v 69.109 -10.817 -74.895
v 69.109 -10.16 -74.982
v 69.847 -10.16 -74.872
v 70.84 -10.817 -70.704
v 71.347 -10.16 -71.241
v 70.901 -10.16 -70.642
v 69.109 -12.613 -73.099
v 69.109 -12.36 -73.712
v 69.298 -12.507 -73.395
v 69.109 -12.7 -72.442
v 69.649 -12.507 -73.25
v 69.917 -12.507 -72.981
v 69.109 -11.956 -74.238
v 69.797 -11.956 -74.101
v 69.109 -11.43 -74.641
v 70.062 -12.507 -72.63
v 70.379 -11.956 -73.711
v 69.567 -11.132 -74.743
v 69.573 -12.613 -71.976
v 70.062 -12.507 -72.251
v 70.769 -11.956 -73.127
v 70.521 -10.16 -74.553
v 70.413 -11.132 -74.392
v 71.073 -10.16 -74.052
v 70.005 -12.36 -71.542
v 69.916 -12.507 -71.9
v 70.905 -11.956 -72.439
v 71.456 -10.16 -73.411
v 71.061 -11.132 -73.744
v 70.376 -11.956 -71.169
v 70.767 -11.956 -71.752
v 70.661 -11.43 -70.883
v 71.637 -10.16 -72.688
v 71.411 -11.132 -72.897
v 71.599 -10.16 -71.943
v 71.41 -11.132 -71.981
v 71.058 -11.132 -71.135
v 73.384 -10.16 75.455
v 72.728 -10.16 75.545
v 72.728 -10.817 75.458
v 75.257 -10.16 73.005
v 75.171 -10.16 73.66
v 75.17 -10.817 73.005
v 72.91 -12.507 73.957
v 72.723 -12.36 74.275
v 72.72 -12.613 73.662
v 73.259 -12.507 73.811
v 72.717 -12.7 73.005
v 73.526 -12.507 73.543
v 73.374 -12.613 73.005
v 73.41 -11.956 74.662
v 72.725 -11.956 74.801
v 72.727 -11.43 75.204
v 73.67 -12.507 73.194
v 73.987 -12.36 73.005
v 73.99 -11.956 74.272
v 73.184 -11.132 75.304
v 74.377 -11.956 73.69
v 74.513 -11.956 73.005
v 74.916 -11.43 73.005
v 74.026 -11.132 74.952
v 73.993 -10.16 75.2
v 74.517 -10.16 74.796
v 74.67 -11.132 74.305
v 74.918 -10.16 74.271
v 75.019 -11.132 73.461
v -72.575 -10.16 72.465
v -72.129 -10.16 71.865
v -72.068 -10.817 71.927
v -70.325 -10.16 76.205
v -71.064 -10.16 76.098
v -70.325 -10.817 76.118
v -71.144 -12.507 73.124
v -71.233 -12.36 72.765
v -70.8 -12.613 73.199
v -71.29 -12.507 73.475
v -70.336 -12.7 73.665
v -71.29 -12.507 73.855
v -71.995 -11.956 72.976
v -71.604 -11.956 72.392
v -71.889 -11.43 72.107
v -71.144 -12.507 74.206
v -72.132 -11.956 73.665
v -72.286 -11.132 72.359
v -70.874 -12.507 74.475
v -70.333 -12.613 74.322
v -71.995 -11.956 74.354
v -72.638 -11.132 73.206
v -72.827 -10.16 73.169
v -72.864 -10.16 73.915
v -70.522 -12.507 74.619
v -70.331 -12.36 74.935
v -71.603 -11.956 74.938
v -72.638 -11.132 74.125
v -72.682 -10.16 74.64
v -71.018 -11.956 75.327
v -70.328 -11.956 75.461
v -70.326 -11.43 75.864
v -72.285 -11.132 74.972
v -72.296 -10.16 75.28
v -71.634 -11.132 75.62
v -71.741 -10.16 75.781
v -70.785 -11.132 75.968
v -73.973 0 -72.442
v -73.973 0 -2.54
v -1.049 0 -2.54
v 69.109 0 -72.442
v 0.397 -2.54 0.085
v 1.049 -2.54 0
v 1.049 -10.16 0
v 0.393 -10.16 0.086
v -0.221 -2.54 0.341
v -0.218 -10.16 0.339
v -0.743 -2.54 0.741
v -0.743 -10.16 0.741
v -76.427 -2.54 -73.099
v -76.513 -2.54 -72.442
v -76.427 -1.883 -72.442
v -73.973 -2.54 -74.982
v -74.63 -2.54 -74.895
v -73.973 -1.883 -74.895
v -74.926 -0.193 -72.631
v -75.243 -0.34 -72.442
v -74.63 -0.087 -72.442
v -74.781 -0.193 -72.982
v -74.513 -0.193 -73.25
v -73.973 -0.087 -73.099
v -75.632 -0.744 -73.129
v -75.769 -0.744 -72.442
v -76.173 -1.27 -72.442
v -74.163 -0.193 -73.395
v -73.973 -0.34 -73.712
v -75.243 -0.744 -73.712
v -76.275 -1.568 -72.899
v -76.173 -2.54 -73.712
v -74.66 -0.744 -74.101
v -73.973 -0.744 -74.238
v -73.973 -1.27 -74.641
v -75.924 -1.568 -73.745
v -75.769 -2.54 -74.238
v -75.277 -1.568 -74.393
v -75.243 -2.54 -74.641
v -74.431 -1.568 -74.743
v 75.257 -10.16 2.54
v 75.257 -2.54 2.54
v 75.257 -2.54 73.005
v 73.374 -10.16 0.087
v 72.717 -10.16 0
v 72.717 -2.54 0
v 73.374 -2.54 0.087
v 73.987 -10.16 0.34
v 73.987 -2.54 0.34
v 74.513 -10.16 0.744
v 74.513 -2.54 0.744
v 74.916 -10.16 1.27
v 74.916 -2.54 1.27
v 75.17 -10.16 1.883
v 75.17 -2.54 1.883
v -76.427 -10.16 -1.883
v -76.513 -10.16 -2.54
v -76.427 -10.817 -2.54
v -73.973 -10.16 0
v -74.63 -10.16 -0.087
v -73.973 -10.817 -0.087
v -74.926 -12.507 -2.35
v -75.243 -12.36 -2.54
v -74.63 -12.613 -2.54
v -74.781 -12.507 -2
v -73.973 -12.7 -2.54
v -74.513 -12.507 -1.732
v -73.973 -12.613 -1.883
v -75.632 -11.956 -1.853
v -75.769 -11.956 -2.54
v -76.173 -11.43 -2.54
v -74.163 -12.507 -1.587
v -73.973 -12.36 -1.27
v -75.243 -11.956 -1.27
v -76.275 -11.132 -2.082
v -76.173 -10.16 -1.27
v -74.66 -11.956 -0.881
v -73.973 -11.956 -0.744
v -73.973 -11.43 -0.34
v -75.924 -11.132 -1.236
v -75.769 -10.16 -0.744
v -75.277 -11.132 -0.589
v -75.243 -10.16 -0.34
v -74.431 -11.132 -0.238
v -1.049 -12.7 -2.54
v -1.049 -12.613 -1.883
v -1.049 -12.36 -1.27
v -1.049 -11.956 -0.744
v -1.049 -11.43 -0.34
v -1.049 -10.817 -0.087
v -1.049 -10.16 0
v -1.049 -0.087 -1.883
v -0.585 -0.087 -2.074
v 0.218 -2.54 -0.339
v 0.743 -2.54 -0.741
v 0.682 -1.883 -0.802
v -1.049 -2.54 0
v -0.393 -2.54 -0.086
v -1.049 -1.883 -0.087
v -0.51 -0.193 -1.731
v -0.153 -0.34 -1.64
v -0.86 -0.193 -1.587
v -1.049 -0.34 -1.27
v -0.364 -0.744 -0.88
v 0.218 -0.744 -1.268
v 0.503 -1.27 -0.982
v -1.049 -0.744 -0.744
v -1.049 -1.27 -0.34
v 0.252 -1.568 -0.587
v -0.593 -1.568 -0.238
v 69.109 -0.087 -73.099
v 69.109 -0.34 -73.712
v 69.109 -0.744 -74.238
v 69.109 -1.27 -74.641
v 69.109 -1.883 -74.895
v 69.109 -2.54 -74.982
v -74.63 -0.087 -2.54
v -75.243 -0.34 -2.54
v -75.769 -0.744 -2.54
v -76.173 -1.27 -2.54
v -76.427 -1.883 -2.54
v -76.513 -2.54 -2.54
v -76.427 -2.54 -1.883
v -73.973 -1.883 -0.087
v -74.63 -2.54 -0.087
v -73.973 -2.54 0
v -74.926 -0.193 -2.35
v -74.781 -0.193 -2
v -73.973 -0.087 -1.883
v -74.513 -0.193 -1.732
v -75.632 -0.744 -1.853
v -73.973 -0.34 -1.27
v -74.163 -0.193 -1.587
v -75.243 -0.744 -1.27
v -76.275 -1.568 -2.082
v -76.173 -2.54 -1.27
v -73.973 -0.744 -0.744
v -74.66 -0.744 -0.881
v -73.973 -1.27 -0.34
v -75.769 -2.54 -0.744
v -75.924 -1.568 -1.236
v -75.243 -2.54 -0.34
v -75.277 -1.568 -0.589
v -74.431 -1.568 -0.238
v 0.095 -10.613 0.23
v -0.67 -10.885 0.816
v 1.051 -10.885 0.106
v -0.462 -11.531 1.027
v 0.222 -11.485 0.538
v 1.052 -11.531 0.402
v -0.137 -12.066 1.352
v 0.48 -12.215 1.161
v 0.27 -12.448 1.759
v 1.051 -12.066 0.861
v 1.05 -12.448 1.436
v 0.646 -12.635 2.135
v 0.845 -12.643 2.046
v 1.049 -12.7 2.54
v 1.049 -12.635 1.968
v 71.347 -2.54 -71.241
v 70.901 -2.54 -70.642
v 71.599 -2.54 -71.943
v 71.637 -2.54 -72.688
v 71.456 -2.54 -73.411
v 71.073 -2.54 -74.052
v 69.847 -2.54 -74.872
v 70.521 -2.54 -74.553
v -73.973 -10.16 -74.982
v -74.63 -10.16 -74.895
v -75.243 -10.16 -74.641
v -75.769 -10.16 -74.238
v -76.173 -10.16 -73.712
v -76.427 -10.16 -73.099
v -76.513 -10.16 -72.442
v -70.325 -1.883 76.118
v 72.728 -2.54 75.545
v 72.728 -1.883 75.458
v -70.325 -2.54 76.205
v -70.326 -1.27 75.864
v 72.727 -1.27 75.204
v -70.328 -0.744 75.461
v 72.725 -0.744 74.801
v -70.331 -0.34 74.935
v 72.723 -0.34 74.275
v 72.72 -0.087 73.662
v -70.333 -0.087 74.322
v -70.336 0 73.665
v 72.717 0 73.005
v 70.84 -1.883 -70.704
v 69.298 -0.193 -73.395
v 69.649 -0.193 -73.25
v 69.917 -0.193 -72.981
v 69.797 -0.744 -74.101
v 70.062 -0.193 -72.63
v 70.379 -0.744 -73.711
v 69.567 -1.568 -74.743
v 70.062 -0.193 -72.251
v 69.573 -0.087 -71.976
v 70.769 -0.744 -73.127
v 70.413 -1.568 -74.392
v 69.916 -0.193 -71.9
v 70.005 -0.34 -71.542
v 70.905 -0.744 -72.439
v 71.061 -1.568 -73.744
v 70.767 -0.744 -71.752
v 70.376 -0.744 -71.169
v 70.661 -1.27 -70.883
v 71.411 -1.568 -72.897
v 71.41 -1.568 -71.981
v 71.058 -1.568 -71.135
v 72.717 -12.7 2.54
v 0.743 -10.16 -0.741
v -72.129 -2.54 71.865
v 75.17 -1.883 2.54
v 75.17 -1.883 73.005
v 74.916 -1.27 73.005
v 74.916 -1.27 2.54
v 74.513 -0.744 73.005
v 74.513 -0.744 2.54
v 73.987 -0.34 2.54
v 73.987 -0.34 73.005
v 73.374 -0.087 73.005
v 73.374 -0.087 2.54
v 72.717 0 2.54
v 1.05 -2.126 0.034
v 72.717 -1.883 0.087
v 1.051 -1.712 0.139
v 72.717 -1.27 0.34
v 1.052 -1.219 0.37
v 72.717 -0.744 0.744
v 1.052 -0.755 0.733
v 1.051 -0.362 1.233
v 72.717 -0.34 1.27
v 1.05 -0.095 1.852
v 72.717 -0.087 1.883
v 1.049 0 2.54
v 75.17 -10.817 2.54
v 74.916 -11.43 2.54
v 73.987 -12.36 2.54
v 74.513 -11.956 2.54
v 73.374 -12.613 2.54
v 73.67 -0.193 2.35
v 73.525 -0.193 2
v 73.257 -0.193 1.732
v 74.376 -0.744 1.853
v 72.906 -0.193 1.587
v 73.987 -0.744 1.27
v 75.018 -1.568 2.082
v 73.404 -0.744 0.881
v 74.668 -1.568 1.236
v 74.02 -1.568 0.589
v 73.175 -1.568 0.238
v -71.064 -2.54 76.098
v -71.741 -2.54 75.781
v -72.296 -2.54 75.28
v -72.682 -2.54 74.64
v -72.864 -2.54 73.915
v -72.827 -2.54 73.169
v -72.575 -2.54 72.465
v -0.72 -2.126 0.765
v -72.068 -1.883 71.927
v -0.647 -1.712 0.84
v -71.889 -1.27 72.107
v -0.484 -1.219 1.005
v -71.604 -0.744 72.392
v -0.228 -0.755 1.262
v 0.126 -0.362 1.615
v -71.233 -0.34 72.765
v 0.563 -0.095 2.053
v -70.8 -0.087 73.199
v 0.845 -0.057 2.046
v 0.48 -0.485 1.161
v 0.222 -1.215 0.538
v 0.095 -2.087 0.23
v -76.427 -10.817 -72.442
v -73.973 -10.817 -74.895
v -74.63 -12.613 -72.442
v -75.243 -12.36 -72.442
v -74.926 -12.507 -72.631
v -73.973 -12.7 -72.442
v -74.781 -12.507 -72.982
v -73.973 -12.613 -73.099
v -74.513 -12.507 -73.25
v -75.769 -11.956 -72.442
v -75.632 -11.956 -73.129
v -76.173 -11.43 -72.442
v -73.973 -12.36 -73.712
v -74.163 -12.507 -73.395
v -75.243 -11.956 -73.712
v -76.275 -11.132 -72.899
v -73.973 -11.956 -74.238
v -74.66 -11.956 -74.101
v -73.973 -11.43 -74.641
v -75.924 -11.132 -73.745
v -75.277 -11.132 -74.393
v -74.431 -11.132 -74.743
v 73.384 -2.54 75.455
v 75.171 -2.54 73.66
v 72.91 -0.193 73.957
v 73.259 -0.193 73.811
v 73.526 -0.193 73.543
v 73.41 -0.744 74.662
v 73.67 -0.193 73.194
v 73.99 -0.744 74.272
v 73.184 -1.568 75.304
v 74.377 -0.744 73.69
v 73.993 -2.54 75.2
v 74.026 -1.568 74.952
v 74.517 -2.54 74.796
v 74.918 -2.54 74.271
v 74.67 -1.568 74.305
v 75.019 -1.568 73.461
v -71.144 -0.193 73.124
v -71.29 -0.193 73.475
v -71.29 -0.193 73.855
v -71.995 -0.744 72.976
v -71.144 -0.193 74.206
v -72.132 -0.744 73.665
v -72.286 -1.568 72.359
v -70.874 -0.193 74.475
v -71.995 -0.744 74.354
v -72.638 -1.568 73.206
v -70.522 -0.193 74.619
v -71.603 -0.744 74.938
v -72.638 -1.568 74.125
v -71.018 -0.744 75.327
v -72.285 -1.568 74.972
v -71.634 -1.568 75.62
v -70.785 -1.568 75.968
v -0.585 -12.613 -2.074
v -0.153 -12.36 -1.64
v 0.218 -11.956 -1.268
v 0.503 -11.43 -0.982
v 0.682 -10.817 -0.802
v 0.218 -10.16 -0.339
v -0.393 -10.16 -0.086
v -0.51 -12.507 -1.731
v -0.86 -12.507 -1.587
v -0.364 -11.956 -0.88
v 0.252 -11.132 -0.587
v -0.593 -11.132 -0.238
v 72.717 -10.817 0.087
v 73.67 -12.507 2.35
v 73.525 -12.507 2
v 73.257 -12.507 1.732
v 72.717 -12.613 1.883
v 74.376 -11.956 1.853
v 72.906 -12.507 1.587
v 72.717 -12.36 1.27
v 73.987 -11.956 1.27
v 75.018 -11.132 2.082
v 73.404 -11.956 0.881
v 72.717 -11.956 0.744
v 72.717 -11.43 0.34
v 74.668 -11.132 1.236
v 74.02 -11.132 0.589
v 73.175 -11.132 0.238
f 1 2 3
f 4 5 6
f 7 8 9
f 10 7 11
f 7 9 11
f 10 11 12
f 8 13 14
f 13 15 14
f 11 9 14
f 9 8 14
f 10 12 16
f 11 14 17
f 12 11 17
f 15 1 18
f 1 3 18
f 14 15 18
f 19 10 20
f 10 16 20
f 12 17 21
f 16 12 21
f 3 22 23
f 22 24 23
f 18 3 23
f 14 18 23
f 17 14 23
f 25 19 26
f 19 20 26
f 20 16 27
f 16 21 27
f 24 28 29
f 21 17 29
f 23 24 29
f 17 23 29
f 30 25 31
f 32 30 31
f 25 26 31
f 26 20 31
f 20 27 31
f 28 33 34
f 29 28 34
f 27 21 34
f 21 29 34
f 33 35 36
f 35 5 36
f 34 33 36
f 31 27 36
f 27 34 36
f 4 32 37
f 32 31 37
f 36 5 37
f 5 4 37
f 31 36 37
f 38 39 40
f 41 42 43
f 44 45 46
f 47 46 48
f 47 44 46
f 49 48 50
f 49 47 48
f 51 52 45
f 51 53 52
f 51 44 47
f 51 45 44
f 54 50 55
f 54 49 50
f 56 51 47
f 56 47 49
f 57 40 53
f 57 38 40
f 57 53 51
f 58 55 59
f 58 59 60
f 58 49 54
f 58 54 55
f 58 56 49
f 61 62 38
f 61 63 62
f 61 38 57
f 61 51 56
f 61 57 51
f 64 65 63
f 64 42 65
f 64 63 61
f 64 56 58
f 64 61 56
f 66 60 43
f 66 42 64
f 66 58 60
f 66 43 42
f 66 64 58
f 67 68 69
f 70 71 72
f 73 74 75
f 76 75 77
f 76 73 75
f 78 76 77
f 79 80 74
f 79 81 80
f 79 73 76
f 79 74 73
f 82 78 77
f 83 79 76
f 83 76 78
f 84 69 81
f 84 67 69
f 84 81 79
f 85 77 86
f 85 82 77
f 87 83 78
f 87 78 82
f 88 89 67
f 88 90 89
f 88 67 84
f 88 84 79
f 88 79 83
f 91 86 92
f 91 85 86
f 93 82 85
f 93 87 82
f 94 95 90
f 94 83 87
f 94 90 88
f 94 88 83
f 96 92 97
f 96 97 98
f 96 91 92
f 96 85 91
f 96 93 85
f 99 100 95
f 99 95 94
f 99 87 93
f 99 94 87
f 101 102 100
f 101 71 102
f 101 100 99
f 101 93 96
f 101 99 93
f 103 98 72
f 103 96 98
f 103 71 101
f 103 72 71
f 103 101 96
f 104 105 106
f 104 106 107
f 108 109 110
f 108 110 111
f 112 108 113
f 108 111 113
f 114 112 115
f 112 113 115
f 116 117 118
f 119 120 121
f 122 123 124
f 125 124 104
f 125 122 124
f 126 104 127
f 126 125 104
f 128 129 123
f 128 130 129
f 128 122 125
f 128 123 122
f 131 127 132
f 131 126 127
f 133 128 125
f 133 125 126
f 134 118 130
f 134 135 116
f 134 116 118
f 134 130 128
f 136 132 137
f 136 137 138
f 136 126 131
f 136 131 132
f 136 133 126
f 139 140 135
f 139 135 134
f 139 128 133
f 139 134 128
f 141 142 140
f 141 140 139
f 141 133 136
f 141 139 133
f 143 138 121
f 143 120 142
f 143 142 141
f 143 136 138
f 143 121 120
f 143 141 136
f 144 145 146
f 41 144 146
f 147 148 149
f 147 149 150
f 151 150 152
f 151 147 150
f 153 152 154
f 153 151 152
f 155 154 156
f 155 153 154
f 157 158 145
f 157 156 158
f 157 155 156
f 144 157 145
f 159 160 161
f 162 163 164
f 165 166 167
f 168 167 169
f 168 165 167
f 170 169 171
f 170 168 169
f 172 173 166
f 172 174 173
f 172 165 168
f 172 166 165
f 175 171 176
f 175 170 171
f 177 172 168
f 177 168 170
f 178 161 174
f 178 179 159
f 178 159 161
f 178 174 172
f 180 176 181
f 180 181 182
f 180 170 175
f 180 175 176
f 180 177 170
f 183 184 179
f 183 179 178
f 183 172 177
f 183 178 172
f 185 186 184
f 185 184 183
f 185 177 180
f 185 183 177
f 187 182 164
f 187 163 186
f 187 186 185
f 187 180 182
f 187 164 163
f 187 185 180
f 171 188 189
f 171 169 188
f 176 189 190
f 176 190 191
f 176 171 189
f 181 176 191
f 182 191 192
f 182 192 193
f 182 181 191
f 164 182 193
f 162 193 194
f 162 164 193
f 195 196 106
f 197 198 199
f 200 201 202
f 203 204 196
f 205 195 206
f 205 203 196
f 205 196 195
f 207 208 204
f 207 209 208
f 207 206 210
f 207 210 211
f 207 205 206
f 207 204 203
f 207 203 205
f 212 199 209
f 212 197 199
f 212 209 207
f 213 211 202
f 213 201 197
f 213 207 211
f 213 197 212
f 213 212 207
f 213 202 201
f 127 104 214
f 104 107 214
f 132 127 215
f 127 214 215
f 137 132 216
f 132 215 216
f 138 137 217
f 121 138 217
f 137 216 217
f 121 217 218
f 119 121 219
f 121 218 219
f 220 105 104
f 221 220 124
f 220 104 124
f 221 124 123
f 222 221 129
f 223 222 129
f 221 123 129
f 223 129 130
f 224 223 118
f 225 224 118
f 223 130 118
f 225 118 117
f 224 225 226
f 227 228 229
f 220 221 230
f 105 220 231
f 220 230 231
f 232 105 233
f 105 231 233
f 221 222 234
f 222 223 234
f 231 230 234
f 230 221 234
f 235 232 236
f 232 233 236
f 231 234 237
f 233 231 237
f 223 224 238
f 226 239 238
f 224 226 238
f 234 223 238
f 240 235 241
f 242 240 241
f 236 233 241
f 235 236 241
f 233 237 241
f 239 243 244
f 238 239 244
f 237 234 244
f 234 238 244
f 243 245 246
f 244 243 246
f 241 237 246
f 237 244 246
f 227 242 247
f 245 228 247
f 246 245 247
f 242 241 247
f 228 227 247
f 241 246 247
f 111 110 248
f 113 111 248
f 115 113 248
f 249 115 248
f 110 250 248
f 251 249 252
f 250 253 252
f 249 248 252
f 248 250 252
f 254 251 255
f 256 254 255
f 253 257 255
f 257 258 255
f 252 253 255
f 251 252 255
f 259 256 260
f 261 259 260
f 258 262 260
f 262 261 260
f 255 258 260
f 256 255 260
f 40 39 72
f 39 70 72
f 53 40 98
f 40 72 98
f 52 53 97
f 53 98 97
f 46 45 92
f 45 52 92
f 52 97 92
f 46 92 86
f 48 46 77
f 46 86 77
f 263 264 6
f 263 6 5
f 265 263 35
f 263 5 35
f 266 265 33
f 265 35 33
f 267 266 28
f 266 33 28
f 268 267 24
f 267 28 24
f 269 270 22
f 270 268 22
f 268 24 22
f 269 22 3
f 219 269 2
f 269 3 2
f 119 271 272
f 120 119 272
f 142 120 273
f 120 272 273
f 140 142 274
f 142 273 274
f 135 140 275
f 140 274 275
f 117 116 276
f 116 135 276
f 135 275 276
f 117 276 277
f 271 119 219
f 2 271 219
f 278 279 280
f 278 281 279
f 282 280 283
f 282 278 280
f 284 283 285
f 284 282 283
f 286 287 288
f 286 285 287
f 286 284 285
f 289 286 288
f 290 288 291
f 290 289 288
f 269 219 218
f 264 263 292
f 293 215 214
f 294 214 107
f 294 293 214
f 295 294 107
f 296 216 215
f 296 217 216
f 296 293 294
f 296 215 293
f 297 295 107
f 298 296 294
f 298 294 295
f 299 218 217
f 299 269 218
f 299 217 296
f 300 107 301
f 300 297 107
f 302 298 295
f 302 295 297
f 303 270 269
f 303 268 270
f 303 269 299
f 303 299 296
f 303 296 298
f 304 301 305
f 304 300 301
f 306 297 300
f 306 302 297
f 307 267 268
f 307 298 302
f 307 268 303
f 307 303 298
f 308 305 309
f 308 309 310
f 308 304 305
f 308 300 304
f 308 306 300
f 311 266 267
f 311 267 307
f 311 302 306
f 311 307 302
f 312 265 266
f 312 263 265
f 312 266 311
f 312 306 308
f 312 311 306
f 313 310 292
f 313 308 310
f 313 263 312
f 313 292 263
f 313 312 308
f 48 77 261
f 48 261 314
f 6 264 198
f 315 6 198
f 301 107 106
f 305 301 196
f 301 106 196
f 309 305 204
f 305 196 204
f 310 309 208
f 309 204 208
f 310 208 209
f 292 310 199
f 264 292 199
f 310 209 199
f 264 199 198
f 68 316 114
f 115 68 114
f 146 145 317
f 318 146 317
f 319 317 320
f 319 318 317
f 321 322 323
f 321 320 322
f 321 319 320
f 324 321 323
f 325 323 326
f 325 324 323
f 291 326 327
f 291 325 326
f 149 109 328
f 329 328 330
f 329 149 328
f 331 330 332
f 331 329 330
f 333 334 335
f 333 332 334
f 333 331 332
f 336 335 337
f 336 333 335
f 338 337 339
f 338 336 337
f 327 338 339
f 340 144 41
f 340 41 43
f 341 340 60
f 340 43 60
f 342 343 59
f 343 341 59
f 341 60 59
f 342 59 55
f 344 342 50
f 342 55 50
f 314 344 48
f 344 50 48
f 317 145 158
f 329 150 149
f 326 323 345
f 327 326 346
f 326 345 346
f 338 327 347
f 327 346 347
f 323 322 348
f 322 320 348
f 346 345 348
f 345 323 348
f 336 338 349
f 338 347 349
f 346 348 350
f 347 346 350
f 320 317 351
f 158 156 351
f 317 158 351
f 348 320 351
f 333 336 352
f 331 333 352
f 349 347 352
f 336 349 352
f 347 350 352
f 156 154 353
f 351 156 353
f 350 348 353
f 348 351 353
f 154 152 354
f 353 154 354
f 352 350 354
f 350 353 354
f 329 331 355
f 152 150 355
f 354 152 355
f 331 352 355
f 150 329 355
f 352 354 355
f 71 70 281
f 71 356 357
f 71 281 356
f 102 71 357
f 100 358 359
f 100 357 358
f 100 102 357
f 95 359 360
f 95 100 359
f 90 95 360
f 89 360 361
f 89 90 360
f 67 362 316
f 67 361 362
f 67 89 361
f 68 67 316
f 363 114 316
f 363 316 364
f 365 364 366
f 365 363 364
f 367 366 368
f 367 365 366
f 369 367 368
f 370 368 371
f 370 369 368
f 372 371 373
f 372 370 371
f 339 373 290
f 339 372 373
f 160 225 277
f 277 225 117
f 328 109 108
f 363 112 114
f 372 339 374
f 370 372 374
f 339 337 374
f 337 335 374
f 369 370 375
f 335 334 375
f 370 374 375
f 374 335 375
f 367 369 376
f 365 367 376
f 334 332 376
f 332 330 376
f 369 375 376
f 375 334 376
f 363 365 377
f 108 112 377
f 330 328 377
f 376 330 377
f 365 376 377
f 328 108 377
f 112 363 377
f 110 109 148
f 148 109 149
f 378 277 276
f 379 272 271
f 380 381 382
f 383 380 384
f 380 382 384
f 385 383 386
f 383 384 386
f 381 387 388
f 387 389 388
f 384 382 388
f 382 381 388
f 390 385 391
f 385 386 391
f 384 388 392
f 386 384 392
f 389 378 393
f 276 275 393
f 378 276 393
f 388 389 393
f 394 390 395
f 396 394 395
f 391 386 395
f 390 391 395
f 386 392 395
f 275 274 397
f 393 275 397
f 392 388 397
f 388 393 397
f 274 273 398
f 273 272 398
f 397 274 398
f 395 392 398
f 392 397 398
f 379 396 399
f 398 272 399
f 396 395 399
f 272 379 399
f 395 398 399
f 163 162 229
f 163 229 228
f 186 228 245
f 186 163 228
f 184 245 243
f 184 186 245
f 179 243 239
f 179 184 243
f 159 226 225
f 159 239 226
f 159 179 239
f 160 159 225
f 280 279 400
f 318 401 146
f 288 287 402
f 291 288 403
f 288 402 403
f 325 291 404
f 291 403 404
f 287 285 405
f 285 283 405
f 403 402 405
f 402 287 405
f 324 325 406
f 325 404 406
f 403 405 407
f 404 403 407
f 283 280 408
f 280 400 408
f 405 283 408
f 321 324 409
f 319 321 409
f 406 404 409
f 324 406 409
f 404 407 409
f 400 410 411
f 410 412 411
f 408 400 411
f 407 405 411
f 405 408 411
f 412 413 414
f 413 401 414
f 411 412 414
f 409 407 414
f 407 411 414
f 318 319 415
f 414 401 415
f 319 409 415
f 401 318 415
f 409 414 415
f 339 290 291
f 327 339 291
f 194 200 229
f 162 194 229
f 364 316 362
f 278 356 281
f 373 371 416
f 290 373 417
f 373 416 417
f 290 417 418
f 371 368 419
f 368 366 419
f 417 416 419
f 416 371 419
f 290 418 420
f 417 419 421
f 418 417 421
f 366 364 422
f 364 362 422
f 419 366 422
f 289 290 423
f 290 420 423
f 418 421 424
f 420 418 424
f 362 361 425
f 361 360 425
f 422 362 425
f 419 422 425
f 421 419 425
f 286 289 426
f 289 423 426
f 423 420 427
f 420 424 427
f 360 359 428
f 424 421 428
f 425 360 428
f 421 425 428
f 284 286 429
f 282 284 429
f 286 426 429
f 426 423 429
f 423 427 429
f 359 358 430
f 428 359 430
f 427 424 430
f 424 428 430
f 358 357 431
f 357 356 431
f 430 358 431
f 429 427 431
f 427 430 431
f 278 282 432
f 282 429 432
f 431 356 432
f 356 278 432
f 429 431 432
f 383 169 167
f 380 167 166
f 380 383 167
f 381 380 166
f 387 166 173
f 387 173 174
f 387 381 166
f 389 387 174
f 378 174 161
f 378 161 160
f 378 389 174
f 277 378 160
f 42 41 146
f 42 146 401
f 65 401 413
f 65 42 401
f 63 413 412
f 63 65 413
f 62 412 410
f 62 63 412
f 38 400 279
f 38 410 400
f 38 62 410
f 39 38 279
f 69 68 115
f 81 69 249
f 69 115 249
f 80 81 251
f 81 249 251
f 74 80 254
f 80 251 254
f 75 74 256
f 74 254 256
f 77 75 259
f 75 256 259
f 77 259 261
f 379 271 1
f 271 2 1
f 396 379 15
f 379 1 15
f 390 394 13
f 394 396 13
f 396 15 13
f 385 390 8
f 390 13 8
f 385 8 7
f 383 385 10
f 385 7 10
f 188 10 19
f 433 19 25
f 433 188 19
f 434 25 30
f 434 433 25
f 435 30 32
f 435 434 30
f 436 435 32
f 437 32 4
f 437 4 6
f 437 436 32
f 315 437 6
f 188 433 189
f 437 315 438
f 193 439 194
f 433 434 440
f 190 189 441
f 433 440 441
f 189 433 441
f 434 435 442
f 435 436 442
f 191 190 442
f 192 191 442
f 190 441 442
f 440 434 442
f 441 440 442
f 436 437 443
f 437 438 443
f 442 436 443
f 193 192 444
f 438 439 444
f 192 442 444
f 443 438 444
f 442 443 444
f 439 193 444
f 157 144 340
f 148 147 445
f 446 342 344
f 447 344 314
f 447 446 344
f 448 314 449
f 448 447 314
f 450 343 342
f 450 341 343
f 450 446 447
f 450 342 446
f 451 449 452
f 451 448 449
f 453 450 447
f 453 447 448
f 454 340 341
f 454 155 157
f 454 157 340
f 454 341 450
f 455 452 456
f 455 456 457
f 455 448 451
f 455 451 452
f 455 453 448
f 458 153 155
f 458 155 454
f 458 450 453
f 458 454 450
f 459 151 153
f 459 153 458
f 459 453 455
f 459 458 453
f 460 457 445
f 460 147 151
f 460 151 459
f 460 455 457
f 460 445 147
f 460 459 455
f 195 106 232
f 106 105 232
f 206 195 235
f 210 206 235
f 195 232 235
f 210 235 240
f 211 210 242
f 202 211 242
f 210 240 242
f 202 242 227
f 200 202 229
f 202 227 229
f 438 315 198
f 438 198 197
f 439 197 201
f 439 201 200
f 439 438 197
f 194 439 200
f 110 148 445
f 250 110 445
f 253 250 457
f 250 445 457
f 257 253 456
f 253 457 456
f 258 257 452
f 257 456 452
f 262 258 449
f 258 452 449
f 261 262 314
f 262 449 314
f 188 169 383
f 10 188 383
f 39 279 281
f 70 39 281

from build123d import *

# Parameters (mm, degrees)
F1_DEPTH = 12.7
F2_R     = 2.54
F2_2_R   = 2.54
F3_R     = 2.54
F3_2_R   = 2.54


with BuildPart() as f1:
    # F0 (on Front) → F1 (new body)
    with BuildSketch(Plane.XZ):
        Polygon((75.2567246384, -74.9815637702), (0, 0), (-76.5130594373, -74.9815637702), align=None)
        Polygon((-76.5130594373, -74.9815637702), (0, 0), (-76.5130594373, 0), align=None)
    extrude(amount=F1_DEPTH)

    # F2
    f2_edges = [f1.edges().sort_by_distance(p)[0] for p in [
        (0, -6.35, 0),
    ]]
    fillet(f2_edges, radius=F2_R)

    # F3
    f3_edges = [f1.edges().sort_by_distance(p)[0] for p in [
        (-76.513059, -6.35, 0),
        (-76.513059, -6.35, -74.981564),
        (-76.513059, 0, -37.490782),
        (-76.513059, -12.7, -37.490782),
        (-38.781219, 0, 0),
        (-1.049378, -6.35, 0),
        (-38.781219, -12.7, 0),
        (75.256725, -6.35, -74.981564),
        (-0.628167, 0, -74.981564),
        (-0.628167, -12.7, -74.981564),
        (38.000052, 0, -37.861113),
        (0.74338, -6.35, -0.740662),
        (38.000052, -12.7, -37.861113),
        (-0.079512, 0, -0.192457),
        (-0.079512, -12.7, -0.192457),
    ]]
    fillet(f3_edges, radius=F3_R)


with BuildPart() as f1b:
    # F0 (on Front) → F1, piece 2 (new body)
    with BuildSketch(Plane.XZ):
        Polygon((75.2567246384, 75.5328952683), (0, 0), (75.2567246384, 0), align=None)
        Polygon((75.2567246384, 75.5328952683), (-76.5130594373, 76.233305037), (0, 0), align=None)
    extrude(amount=F1_DEPTH)

    # F2#2
    f2_2_edges = [f1b.edges().sort_by_distance(p)[0] for p in [
        (-76.513059, -6.35, 76.233305),
        (-38.25653, 0, 38.116653),
        (-38.25653, -12.7, 38.116653),
        (75.256725, -6.35, 75.532895),
        (-0.628167, 0, 75.8831),
        (-0.628167, -12.7, 75.8831),
        (75.256725, -6.35, 0),
        (75.256725, 0, 37.766448),
        (75.256725, -12.7, 37.766448),
        (37.628362, 0, 0),
        (37.628362, -12.7, 0),
    ]]
    fillet(f2_2_edges, radius=F2_2_R)

    # F3#2
    f3_2_edges = [f1b.edges().sort_by_distance(p)[0] for p in [
        (0, -6.35, 0),
    ]]
    fillet(f3_2_edges, radius=F3_2_R)


solid = Compound([f1.part, f1b.part])
